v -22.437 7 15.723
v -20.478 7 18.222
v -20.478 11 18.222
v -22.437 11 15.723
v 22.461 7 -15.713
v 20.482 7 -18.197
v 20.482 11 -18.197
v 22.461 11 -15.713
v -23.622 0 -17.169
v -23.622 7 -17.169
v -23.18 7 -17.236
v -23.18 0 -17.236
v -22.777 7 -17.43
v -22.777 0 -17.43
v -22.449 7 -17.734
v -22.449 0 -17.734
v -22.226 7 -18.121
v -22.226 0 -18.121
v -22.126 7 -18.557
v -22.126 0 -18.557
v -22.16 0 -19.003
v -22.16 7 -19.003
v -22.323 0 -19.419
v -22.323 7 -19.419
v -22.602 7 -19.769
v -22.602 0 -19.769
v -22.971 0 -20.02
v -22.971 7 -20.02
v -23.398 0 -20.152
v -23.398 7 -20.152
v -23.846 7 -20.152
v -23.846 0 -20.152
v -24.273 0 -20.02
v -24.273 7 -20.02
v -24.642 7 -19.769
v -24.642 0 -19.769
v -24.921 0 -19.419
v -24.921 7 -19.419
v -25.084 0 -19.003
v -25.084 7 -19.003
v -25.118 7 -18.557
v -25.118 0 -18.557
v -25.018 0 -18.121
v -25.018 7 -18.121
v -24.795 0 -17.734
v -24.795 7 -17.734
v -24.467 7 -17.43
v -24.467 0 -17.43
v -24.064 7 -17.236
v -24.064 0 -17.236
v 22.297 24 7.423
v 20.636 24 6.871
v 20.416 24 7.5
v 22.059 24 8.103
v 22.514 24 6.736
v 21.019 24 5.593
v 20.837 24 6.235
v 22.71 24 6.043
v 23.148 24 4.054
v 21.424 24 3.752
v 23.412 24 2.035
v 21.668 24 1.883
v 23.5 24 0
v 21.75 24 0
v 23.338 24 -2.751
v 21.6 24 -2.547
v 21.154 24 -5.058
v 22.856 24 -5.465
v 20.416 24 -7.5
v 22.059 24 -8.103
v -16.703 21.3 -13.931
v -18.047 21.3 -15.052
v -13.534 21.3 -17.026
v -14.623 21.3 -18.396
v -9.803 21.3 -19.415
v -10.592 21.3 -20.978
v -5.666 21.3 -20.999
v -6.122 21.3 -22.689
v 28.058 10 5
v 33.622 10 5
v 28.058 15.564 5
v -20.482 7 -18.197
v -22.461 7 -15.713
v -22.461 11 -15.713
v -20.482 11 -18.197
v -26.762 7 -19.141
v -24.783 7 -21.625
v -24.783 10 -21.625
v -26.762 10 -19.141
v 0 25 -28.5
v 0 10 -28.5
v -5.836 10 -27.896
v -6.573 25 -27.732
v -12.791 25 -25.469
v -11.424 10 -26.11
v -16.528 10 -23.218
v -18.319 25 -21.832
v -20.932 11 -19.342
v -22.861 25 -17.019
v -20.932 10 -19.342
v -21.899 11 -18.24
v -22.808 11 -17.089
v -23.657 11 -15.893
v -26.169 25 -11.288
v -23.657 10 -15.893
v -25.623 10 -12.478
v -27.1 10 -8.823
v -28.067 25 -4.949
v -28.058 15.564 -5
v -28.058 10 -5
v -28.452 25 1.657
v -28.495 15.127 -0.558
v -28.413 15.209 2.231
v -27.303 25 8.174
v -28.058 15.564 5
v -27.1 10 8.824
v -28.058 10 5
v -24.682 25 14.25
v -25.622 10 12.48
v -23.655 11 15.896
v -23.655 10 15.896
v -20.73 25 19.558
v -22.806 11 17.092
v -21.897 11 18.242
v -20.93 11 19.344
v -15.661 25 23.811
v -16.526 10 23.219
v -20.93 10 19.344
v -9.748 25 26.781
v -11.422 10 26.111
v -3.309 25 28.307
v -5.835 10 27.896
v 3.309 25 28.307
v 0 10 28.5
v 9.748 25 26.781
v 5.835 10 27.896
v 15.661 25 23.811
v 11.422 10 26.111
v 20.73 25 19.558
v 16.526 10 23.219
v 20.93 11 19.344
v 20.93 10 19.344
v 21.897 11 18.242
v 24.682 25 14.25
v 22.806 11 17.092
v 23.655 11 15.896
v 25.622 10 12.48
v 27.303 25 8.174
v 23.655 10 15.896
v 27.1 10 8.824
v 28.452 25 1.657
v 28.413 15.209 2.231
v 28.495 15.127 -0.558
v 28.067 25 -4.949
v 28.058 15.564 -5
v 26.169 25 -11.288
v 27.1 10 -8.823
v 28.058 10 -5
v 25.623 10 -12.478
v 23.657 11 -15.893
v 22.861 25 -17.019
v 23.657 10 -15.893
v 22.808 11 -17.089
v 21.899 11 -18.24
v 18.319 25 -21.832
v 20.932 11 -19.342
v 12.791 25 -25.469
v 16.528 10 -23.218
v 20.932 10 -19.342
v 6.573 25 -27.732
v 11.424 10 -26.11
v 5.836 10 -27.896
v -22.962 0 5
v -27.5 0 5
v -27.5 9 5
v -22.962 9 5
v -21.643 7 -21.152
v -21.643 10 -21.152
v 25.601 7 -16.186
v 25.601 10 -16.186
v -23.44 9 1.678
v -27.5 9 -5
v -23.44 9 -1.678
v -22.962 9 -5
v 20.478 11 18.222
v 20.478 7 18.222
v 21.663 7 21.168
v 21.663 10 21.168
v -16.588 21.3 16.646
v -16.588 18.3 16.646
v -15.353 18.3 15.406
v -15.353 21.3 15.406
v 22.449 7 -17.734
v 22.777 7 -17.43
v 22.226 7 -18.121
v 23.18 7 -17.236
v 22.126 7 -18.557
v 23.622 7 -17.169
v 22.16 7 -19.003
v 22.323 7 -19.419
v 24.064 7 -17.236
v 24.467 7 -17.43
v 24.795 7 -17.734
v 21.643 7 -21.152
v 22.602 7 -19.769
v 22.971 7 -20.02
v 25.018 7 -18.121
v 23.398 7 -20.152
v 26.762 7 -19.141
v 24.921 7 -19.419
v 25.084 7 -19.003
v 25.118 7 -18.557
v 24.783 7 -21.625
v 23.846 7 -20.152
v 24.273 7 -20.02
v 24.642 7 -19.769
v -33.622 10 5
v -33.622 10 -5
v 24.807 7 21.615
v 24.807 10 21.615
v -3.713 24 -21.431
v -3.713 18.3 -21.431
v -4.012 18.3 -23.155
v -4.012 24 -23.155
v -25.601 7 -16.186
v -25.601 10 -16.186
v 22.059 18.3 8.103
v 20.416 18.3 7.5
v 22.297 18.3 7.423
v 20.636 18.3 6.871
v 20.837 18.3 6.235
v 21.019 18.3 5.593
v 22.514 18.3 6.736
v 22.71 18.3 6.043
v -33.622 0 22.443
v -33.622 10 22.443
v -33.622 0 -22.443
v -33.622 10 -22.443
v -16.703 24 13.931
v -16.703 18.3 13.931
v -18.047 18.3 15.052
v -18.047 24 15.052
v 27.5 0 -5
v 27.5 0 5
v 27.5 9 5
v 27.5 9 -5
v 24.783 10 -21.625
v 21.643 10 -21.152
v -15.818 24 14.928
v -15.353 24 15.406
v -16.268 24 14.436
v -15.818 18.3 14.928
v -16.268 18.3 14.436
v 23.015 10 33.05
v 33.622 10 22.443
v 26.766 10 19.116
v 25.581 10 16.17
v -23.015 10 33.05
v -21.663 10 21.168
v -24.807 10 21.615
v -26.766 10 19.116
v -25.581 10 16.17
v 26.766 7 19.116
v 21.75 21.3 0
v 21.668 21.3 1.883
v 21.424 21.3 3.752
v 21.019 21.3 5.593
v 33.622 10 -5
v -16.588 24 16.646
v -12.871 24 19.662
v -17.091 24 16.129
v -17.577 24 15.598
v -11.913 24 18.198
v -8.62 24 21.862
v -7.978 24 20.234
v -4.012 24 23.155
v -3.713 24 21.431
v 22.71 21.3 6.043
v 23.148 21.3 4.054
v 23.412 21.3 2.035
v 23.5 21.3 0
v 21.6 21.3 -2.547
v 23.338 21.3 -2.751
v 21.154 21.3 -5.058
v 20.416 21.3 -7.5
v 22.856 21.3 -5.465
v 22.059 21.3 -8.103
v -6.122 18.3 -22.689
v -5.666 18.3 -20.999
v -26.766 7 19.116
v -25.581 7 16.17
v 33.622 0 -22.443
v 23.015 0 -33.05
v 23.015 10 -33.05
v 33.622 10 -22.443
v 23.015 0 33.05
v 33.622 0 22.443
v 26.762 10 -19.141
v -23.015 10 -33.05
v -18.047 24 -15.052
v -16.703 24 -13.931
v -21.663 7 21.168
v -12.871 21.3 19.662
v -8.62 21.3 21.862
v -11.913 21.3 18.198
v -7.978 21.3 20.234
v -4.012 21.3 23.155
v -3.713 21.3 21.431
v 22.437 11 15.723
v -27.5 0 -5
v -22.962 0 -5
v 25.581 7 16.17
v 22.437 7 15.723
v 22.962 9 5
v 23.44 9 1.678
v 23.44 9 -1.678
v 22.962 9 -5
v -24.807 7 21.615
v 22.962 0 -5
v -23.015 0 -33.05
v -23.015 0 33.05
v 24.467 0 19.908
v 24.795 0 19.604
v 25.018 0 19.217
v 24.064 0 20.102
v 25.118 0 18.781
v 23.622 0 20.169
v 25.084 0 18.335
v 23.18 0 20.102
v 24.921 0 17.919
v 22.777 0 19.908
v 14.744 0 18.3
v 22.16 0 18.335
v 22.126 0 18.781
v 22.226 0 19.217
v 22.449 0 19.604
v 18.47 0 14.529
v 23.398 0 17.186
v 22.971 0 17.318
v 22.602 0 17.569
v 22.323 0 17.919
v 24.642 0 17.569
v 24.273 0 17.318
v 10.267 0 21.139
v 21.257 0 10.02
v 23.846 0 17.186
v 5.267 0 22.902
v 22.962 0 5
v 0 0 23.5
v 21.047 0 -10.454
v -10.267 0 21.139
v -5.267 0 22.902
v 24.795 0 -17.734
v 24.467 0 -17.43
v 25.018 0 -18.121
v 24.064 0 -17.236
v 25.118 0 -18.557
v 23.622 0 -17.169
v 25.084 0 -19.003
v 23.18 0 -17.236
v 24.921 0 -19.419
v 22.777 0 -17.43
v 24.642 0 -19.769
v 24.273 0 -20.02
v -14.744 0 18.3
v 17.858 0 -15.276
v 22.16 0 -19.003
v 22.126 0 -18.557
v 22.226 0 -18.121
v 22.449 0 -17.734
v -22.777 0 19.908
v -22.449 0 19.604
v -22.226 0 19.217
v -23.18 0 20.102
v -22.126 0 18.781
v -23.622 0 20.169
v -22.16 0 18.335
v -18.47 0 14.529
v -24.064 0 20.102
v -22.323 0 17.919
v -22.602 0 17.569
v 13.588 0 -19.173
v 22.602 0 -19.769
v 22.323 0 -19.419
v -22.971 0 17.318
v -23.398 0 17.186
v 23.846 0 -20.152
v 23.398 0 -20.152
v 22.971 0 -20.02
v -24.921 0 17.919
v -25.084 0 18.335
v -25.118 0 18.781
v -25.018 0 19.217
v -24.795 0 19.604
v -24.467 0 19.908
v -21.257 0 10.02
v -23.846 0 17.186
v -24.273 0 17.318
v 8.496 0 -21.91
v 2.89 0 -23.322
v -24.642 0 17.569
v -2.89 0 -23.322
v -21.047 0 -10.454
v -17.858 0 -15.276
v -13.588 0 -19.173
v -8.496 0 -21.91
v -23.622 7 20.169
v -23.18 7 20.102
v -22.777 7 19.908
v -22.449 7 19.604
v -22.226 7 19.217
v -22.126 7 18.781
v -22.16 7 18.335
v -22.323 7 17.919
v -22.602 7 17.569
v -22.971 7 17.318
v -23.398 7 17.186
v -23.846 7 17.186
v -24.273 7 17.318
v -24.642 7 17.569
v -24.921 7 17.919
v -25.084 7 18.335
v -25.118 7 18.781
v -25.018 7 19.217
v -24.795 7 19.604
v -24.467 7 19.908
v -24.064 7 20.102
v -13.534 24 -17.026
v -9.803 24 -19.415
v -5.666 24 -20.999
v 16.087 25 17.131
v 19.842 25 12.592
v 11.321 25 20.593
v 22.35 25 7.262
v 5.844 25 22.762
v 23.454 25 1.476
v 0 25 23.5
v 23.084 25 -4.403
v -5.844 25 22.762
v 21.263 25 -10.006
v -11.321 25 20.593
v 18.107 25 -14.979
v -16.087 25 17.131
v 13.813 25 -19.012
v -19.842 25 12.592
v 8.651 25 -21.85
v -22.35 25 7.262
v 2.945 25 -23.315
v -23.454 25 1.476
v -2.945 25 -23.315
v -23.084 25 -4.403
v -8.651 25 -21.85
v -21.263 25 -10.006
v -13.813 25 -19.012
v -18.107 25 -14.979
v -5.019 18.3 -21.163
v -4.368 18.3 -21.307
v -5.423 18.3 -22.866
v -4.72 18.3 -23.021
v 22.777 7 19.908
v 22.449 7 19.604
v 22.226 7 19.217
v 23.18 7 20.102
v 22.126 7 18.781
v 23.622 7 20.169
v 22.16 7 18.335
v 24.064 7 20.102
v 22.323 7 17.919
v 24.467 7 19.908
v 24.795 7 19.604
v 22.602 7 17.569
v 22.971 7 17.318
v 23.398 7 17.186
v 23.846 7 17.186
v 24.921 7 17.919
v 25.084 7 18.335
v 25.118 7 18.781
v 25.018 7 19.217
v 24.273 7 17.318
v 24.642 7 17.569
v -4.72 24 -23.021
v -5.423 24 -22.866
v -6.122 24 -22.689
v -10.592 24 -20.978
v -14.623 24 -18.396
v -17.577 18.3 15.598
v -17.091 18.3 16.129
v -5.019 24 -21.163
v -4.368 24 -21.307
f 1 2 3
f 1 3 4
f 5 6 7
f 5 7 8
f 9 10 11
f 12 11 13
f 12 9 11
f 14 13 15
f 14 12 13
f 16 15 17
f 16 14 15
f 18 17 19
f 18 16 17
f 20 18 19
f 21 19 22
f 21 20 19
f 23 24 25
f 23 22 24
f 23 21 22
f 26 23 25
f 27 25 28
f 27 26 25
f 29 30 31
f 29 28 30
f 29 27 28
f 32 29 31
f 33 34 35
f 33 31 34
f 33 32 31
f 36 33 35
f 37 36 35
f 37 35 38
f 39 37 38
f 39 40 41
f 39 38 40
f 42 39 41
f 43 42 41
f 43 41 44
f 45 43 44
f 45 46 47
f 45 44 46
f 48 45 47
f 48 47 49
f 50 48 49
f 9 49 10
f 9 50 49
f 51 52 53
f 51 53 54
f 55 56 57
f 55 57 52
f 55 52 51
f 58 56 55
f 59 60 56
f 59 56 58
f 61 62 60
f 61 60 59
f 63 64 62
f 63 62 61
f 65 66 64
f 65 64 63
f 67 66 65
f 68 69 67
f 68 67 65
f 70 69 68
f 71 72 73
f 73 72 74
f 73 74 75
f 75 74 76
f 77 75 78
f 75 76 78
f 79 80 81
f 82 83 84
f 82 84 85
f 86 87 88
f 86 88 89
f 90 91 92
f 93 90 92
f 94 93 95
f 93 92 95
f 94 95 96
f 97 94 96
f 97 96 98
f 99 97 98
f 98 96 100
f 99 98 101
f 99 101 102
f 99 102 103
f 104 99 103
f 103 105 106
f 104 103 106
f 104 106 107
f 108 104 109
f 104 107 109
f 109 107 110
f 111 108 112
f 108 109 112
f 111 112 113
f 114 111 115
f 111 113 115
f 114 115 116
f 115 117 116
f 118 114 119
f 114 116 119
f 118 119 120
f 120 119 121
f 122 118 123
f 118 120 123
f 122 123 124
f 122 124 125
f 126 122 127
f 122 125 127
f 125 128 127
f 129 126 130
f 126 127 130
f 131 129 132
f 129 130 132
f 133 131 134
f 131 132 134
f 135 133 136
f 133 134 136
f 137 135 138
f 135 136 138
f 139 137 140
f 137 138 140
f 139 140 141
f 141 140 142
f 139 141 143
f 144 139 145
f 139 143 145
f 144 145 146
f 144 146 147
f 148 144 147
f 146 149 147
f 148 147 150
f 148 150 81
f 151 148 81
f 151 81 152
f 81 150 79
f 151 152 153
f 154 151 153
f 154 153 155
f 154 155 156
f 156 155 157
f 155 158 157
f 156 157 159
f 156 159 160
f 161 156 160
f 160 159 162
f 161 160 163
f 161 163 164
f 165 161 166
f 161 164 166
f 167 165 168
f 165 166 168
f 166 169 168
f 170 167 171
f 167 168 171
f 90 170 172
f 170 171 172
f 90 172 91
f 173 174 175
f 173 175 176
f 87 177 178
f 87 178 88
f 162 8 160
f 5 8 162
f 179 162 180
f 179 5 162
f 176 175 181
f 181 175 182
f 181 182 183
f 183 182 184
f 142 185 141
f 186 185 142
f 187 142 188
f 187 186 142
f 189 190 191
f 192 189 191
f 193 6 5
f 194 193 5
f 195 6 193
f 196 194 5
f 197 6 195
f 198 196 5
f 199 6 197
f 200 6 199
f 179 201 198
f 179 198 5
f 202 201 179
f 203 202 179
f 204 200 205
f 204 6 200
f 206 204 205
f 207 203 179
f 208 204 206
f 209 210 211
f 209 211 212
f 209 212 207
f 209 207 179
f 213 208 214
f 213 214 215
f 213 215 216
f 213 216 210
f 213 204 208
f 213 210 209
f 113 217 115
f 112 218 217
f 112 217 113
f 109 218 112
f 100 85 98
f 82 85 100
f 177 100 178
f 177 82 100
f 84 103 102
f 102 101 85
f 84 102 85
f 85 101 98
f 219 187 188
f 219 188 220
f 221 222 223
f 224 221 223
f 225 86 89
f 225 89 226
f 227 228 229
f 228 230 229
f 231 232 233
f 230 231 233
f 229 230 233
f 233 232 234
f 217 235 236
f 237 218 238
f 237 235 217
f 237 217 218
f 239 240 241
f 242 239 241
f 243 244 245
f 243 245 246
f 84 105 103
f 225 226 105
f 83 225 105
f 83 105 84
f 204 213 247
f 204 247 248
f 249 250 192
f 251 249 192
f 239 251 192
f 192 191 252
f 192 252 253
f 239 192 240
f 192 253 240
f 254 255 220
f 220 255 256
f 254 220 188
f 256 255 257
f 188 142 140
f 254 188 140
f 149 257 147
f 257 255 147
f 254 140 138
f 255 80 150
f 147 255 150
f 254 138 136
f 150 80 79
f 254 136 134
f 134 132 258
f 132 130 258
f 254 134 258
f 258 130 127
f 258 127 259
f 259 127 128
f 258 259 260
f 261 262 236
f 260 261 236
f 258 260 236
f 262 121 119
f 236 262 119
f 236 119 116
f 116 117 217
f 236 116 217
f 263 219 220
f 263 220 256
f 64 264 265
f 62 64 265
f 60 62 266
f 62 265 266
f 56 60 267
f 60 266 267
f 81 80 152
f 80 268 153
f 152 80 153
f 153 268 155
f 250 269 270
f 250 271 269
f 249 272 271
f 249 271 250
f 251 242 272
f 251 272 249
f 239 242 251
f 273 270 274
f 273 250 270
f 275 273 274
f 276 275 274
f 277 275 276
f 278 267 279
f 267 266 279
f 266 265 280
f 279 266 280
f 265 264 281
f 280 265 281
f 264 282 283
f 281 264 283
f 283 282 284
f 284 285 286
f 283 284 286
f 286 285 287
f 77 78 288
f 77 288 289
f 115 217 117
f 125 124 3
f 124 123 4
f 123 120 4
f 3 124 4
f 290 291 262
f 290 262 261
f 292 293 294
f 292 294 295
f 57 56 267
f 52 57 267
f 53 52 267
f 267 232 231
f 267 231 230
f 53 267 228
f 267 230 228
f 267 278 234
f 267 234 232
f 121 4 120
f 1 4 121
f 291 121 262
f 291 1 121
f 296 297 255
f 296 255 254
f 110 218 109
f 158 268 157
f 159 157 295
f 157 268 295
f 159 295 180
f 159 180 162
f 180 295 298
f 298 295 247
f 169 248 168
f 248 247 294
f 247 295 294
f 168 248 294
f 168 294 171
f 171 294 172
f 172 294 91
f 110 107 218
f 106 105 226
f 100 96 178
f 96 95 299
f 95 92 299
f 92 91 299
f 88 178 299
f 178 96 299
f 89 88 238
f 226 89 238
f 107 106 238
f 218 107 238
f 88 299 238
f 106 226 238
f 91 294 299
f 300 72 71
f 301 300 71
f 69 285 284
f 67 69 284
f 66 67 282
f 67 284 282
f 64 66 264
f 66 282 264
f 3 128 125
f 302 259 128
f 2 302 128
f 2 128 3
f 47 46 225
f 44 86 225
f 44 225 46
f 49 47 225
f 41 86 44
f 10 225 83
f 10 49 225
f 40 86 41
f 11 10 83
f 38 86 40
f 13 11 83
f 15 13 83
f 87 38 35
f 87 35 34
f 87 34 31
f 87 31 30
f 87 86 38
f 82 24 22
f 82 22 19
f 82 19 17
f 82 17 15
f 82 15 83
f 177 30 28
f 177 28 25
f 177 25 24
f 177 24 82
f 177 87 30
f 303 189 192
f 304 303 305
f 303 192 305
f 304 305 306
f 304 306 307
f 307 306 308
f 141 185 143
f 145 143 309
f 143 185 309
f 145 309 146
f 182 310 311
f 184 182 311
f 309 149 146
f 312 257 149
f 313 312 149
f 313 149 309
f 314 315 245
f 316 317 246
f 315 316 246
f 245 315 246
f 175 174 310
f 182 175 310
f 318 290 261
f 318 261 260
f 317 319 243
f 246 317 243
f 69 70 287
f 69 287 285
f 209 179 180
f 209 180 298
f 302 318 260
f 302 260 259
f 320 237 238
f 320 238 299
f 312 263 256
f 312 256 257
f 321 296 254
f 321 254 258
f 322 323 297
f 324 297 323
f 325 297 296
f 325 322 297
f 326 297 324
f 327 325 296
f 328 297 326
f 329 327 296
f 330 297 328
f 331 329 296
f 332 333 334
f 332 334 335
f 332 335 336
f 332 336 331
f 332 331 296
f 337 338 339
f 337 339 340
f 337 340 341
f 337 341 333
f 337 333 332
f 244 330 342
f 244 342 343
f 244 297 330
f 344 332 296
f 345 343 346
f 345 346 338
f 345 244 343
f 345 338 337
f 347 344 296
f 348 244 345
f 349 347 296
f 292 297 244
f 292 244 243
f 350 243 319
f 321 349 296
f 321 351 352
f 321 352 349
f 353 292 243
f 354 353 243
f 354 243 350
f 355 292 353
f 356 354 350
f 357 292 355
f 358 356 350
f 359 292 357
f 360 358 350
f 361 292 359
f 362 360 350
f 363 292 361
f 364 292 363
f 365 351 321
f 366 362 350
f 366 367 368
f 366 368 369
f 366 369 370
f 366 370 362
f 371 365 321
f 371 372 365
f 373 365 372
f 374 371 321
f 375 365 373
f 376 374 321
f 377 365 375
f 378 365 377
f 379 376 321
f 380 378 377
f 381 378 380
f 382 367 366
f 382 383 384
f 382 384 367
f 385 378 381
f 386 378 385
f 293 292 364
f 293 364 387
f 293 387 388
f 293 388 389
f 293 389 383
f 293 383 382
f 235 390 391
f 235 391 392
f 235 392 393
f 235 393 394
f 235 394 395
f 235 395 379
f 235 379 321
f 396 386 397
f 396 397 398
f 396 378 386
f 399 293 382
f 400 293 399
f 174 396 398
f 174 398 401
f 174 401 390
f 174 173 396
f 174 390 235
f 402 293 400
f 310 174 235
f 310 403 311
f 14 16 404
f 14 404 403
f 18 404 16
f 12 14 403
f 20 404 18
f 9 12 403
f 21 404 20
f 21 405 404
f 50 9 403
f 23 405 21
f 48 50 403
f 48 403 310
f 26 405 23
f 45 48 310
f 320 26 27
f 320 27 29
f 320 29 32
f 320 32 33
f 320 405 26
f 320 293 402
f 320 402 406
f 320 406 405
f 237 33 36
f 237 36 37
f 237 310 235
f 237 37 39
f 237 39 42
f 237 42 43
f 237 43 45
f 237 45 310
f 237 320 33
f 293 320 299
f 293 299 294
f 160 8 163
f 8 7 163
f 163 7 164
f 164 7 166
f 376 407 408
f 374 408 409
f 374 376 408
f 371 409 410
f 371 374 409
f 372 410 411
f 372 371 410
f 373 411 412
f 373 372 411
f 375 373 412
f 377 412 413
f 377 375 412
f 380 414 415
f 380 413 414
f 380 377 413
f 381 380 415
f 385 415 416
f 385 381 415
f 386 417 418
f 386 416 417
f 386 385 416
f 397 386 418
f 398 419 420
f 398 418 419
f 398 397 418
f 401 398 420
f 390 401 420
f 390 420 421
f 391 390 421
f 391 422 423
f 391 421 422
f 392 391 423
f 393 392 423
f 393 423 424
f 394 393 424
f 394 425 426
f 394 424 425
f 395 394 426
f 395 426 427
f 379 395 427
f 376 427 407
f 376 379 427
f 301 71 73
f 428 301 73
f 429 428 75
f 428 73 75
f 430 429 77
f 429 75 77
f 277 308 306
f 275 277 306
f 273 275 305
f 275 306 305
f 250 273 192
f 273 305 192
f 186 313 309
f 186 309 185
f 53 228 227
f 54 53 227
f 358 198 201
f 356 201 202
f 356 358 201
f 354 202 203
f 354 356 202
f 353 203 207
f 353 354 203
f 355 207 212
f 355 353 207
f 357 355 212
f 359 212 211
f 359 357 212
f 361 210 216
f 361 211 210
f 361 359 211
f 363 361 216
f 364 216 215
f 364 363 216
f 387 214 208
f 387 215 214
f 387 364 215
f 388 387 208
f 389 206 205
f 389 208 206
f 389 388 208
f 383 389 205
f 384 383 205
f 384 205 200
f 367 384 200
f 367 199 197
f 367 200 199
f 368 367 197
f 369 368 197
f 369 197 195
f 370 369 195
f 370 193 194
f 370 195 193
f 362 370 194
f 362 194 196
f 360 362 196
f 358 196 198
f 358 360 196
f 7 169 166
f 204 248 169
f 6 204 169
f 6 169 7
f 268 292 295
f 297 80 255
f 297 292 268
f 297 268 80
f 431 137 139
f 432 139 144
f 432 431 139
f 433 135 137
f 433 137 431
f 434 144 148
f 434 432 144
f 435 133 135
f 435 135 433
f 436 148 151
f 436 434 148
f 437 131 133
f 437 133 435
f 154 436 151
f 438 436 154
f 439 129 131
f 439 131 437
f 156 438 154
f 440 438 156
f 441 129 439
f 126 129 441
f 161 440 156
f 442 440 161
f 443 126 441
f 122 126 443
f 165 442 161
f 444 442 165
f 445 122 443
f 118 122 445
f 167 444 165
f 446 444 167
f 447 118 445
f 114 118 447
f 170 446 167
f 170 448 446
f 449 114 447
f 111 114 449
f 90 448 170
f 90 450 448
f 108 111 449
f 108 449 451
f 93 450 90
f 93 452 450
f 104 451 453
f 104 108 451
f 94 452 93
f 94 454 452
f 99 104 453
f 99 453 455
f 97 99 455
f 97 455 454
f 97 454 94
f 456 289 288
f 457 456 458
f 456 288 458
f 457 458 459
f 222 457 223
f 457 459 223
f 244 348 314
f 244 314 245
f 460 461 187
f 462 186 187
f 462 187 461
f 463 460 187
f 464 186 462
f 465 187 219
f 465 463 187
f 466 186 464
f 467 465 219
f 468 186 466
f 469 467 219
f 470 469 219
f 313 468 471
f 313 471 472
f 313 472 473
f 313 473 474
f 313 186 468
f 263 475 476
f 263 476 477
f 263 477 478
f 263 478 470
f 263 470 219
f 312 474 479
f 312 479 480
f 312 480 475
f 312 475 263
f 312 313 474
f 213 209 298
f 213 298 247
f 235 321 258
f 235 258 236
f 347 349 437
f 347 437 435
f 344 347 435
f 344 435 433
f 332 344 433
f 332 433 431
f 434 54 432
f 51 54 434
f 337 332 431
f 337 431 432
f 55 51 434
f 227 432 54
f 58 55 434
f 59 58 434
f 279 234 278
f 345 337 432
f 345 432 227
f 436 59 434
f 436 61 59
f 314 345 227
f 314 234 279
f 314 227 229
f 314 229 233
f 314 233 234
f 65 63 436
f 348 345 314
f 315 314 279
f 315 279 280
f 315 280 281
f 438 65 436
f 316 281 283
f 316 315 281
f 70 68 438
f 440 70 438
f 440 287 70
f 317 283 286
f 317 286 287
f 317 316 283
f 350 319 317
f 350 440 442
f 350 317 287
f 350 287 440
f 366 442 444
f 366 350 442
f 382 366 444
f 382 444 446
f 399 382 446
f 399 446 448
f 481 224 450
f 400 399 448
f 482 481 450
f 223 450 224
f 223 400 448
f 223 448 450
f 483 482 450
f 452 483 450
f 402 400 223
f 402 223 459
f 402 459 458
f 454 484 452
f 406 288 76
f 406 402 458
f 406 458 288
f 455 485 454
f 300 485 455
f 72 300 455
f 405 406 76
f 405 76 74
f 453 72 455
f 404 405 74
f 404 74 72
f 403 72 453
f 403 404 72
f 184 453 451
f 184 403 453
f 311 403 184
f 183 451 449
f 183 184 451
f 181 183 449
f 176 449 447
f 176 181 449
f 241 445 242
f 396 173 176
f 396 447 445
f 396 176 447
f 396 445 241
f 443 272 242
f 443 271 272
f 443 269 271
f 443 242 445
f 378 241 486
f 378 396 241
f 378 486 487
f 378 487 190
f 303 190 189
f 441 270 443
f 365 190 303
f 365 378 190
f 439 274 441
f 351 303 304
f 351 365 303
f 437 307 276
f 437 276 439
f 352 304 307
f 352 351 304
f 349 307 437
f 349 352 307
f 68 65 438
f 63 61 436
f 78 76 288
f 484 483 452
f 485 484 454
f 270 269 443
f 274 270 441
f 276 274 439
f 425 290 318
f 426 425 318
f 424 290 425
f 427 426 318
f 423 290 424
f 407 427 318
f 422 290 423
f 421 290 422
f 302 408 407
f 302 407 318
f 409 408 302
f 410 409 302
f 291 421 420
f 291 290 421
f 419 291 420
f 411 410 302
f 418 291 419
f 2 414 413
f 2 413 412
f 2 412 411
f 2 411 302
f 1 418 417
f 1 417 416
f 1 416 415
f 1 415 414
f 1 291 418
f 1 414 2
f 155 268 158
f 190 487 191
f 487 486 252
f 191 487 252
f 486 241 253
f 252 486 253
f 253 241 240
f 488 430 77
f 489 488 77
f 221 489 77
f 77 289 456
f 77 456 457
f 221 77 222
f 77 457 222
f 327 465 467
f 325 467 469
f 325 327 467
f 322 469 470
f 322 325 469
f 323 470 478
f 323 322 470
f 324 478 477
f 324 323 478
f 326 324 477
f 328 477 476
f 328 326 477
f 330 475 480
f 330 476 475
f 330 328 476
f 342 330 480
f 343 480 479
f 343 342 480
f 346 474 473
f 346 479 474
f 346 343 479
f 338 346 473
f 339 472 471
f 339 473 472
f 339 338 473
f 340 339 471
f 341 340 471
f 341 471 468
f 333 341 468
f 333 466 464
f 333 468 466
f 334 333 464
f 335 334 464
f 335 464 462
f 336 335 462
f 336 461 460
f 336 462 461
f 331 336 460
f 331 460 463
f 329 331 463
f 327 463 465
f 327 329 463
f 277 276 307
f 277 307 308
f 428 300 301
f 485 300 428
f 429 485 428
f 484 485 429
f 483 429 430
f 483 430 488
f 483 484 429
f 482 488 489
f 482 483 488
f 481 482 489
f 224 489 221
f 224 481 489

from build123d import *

# Parameters (mm, degrees)
SKETCH_1_R               = 23.5
SKETCH_1_R_2             = 1.5
EXTRUDE_1_DEPTH          = 10
SKETCH_2_R               = 28.5
SKETCH_2_R_2             = 23.5
EXTRUDE_2_DEPTH          = 25
SKETCH_5_W               = 55
SKETCH_5_H               = 10
CUT_EXTRUDE_1_DEPTH      = 9
RIB_6_REACH              = 55.364
SKETCH_7_WALL_W          = 123.679532162
SKETCH_7_WALL_H          = 10
CUT_EXTRUDE_2_DEPTH      = 1
CUT_EXTRUDE_2_DEPTH_BACK = 3
CUT_EXTRUDE_2_START      = 10
EXTRUDE_START            = -3.7
EXTRUDE_3_DEPTH          = 2.7
EXTRUDE_START_2          = -6.7
EXTRUDE_5_DEPTH          = 3


with BuildPart() as part:
    # 草图1 → 凸台-拉伸1 (new body)
    with BuildSketch(Plane(origin=(0, 0, 0), x_dir=(1, 0, 0), z_dir=(0, 1, 0))):
        Polygon((-23.015398282, 33.05), (23.015398282, 33.05), (33.622, 22.443398282), (33.622, -22.443398282), (23.015398282, -33.05), (-23.015398282, -33.05), (-33.622, -22.443398282), (-33.622, 22.443398282), align=None)
        with Locations(Location((0, 0, 0), (0, 0, 270))):
            Circle(SKETCH_1_R, mode=Mode.SUBTRACT)
        with Locations(Location((-23.622, 18.669, 0), (0, 0, 270))):
            Circle(SKETCH_1_R_2, mode=Mode.SUBTRACT)
        with Locations(Location((23.622, 18.669, 0), (0, 0, 270))):
            Circle(SKETCH_1_R_2, mode=Mode.SUBTRACT)
        with Locations(Location((23.622, -18.669, 0), (0, 0, 270))):
            Circle(SKETCH_1_R_2, mode=Mode.SUBTRACT)
        with Locations(Location((-23.622, -18.669, 0), (0, 0, 270))):
            Circle(SKETCH_1_R_2, mode=Mode.SUBTRACT)
    extrude(amount=EXTRUDE_1_DEPTH)

    # 草图2 → 凸台-拉伸2 (add)
    with BuildSketch(Plane(origin=(0, 0, 0), x_dir=(1, 0, 0), z_dir=(0, 1, 0))):
        with Locations(Location((0, 0, 0), (0, 0, 90))):
            Circle(SKETCH_2_R)
        with Locations(Location((0, 0, 0), (0, 0, 270))):
            Circle(SKETCH_2_R_2, mode=Mode.SUBTRACT)
    extrude(amount=EXTRUDE_2_DEPTH)

    # 草图5 → 切除-拉伸1 (cut)
    with BuildSketch(Plane(origin=(0, 0, 0), x_dir=(1, 0, 0), z_dir=(0, 1, 0))):
        Rectangle(SKETCH_5_W, SKETCH_5_H)
    extrude(amount=CUT_EXTRUDE_1_DEPTH, mode=Mode.SUBTRACT)

    # 草图7 wall → 筋6 (add, up to next)
    with BuildSketch(Plane(origin=(-28.336, 15.286, 0), x_dir=(0.707106781187, 0.707106781187, 0), z_dir=(-0.707106781187, 0.707106781187, 0)), mode=Mode.PRIVATE) as rib_6_sk1:
        Rectangle(SKETCH_7_WALL_W, SKETCH_7_WALL_H)
    rib_6_tool1 = extrude(rib_6_sk1.sketch, amount=-RIB_6_REACH, mode=Mode.PRIVATE) - part.part
    rib_6 = rib_6_tool1.solids().sort_by_distance((-28.336, 15.286, 0))[0]
    add(rib_6)

    # 镜向1: 筋6 across plane
    add(rib_6.mirror(Plane(origin=(0, 0, 0), x_dir=(0, 0, 1), z_dir=(1, 0, 0))))

    # 草图9 → 切除-拉伸2 (cut, two sides: drawn at the far end of the back side and taken through both)
    with BuildSketch(Plane(origin=(0, 0, 0), x_dir=(1, 0, 0), z_dir=(0, 1, 0)).offset(CUT_EXTRUDE_2_START - CUT_EXTRUDE_2_DEPTH_BACK)):
        Polygon((-24.807031722, -21.615019883), (-21.663187802, -21.168277517), (-20.47815608, -18.222257634), (-22.436968278, -15.722980117), (-25.580812198, -16.169722483), (-26.76584392, -19.115742366), align=None)
        Polygon((26.76584392, -19.115742366), (25.580812198, -16.169722483), (22.436968278, -15.722980117), (20.47815608, -18.222257634), (21.663187802, -21.168277517), (24.807031722, -21.615019883), align=None)
        Polygon((25.601030295, 16.185701302), (26.762114905, 19.141241161), (24.783084611, 21.624539859), (21.642969705, 21.152298698), (20.481885095, 18.196758839), (22.460915389, 15.713460141), align=None)
        Polygon((-25.601030295, 16.185701302), (-22.460915389, 15.713460141), (-20.481885095, 18.196758839), (-21.642969705, 21.152298698), (-24.783084611, 21.624539859), (-26.762114905, 19.141241161), align=None)
    extrude(amount=CUT_EXTRUDE_2_DEPTH + CUT_EXTRUDE_2_DEPTH_BACK, mode=Mode.SUBTRACT)

    # 草图10 → 凸台-拉伸3 (add)
    with BuildSketch(Plane(origin=(0, 25, 0), x_dir=(1, 0, 0), z_dir=(0, 1, 0)).offset(EXTRUDE_START)):
        with BuildLine():
            ThreePointArc((-6.121524921, 22.688696142), (-12.673279961, 19.78984525), (-18.047118042, 15.051628828))
            Line((-18.047118042, 15.051628828), (-16.70318372, 13.930762851))
            ThreePointArc((-16.70318372, 13.930762851), (-11.72952507, 18.31613337), (-5.665666682, 20.999112387))
            Line((-5.665666682, 20.999112387), (-6.121524921, 22.688696142))
        make_face()
        with BuildLine():
            Line((-3.712802663, 21.430762851), (-4.011533912, 23.155077104))
            ThreePointArc((-4.011533912, 23.155077104), (-5.071892953, 22.946152224), (-6.121524921, 22.688696142))
            Line((-6.121524921, 22.688696142), (-5.665666682, 20.999112387))
            ThreePointArc((-5.665666682, 20.999112387), (-4.694198797, 21.237396207), (-3.712802663, 21.430762851))
        make_face()
        with BuildLine():
            Line((21.018598125, -5.592944917), (22.709749699, -6.04295198))
            ThreePointArc((22.709749699, -6.04295198), (23.301599923, -3.047202166), (23.5, 0))
            ThreePointArc((23.5, 0), (23.136857186, 4.115317671), (22.058651954, 8.103448276))
            Line((22.058651954, 8.103448276), (20.415986383, 7.5))
            ThreePointArc((20.415986383, 7.5), (21.413899736, 3.808857845), (21.75, 0))
            ThreePointArc((21.75, 0), (21.566374397, -2.820282856), (21.018598125, -5.592944917))
        make_face()
        with BuildLine():
            Line((20.415986383, -7.5), (22.058651954, -8.103448276))
            ThreePointArc((22.058651954, -8.103448276), (22.407897221, -7.080687969), (22.709749699, -6.04295198))
            Line((22.709749699, -6.04295198), (21.018598125, -5.592944917))
            ThreePointArc((21.018598125, -5.592944917), (20.739224024, -6.553402695), (20.415986383, -7.5))
        make_face()
        with BuildLine():
            ThreePointArc((-16.588224778, -16.645744163), (-10.801868743, -20.870305021), (-4.011533912, -23.155077104))
            Line((-4.011533912, -23.155077104), (-3.712802663, -21.430762851))
            ThreePointArc((-3.712802663, -21.430762851), (-9.997474263, -19.31613337), (-15.352931443, -15.40616747))
            Line((-15.352931443, -15.40616747), (-16.588224778, -16.645744163))
        make_face()
        with BuildLine():
            ThreePointArc((-18.047118042, -15.051628828), (-17.336004268, -15.865464255), (-16.588224778, -16.645744163))
            Line((-16.588224778, -16.645744163), (-15.352931443, -15.40616747))
            ThreePointArc((-15.352931443, -15.40616747), (-16.045025227, -14.683993512), (-16.70318372, -13.930762851))
            Line((-16.70318372, -13.930762851), (-18.047118042, -15.051628828))
        make_face()
    extrude(amount=EXTRUDE_3_DEPTH)

    # 草图10<3> → 凸台-拉伸5 (add)
    with BuildSketch(Plane(origin=(0, 25, 0), x_dir=(1, 0, 0), z_dir=(0, 1, 0)).offset(EXTRUDE_START_2)):
        with BuildLine():
            Line((-3.712802663, 21.430762851), (-4.011533912, 23.155077104))
            ThreePointArc((-4.011533912, 23.155077104), (-5.071892953, 22.946152224), (-6.121524921, 22.688696142))
            Line((-6.121524921, 22.688696142), (-5.665666682, 20.999112387))
            ThreePointArc((-5.665666682, 20.999112387), (-4.694198797, 21.237396207), (-3.712802663, 21.430762851))
        make_face()
        with BuildLine():
            ThreePointArc((-18.047118042, -15.051628828), (-17.336004268, -15.865464255), (-16.588224778, -16.645744163))
            Line((-16.588224778, -16.645744163), (-15.352931443, -15.40616747))
            ThreePointArc((-15.352931443, -15.40616747), (-16.045025227, -14.683993512), (-16.70318372, -13.930762851))
            Line((-16.70318372, -13.930762851), (-18.047118042, -15.051628828))
        make_face()
        with BuildLine():
            Line((20.415986383, -7.5), (22.058651954, -8.103448276))
            ThreePointArc((22.058651954, -8.103448276), (22.407897221, -7.080687969), (22.709749699, -6.04295198))
            Line((22.709749699, -6.04295198), (21.018598125, -5.592944917))
            ThreePointArc((21.018598125, -5.592944917), (20.739224024, -6.553402695), (20.415986383, -7.5))
        make_face()
    extrude(amount=EXTRUDE_5_DEPTH)


solid = part.part
